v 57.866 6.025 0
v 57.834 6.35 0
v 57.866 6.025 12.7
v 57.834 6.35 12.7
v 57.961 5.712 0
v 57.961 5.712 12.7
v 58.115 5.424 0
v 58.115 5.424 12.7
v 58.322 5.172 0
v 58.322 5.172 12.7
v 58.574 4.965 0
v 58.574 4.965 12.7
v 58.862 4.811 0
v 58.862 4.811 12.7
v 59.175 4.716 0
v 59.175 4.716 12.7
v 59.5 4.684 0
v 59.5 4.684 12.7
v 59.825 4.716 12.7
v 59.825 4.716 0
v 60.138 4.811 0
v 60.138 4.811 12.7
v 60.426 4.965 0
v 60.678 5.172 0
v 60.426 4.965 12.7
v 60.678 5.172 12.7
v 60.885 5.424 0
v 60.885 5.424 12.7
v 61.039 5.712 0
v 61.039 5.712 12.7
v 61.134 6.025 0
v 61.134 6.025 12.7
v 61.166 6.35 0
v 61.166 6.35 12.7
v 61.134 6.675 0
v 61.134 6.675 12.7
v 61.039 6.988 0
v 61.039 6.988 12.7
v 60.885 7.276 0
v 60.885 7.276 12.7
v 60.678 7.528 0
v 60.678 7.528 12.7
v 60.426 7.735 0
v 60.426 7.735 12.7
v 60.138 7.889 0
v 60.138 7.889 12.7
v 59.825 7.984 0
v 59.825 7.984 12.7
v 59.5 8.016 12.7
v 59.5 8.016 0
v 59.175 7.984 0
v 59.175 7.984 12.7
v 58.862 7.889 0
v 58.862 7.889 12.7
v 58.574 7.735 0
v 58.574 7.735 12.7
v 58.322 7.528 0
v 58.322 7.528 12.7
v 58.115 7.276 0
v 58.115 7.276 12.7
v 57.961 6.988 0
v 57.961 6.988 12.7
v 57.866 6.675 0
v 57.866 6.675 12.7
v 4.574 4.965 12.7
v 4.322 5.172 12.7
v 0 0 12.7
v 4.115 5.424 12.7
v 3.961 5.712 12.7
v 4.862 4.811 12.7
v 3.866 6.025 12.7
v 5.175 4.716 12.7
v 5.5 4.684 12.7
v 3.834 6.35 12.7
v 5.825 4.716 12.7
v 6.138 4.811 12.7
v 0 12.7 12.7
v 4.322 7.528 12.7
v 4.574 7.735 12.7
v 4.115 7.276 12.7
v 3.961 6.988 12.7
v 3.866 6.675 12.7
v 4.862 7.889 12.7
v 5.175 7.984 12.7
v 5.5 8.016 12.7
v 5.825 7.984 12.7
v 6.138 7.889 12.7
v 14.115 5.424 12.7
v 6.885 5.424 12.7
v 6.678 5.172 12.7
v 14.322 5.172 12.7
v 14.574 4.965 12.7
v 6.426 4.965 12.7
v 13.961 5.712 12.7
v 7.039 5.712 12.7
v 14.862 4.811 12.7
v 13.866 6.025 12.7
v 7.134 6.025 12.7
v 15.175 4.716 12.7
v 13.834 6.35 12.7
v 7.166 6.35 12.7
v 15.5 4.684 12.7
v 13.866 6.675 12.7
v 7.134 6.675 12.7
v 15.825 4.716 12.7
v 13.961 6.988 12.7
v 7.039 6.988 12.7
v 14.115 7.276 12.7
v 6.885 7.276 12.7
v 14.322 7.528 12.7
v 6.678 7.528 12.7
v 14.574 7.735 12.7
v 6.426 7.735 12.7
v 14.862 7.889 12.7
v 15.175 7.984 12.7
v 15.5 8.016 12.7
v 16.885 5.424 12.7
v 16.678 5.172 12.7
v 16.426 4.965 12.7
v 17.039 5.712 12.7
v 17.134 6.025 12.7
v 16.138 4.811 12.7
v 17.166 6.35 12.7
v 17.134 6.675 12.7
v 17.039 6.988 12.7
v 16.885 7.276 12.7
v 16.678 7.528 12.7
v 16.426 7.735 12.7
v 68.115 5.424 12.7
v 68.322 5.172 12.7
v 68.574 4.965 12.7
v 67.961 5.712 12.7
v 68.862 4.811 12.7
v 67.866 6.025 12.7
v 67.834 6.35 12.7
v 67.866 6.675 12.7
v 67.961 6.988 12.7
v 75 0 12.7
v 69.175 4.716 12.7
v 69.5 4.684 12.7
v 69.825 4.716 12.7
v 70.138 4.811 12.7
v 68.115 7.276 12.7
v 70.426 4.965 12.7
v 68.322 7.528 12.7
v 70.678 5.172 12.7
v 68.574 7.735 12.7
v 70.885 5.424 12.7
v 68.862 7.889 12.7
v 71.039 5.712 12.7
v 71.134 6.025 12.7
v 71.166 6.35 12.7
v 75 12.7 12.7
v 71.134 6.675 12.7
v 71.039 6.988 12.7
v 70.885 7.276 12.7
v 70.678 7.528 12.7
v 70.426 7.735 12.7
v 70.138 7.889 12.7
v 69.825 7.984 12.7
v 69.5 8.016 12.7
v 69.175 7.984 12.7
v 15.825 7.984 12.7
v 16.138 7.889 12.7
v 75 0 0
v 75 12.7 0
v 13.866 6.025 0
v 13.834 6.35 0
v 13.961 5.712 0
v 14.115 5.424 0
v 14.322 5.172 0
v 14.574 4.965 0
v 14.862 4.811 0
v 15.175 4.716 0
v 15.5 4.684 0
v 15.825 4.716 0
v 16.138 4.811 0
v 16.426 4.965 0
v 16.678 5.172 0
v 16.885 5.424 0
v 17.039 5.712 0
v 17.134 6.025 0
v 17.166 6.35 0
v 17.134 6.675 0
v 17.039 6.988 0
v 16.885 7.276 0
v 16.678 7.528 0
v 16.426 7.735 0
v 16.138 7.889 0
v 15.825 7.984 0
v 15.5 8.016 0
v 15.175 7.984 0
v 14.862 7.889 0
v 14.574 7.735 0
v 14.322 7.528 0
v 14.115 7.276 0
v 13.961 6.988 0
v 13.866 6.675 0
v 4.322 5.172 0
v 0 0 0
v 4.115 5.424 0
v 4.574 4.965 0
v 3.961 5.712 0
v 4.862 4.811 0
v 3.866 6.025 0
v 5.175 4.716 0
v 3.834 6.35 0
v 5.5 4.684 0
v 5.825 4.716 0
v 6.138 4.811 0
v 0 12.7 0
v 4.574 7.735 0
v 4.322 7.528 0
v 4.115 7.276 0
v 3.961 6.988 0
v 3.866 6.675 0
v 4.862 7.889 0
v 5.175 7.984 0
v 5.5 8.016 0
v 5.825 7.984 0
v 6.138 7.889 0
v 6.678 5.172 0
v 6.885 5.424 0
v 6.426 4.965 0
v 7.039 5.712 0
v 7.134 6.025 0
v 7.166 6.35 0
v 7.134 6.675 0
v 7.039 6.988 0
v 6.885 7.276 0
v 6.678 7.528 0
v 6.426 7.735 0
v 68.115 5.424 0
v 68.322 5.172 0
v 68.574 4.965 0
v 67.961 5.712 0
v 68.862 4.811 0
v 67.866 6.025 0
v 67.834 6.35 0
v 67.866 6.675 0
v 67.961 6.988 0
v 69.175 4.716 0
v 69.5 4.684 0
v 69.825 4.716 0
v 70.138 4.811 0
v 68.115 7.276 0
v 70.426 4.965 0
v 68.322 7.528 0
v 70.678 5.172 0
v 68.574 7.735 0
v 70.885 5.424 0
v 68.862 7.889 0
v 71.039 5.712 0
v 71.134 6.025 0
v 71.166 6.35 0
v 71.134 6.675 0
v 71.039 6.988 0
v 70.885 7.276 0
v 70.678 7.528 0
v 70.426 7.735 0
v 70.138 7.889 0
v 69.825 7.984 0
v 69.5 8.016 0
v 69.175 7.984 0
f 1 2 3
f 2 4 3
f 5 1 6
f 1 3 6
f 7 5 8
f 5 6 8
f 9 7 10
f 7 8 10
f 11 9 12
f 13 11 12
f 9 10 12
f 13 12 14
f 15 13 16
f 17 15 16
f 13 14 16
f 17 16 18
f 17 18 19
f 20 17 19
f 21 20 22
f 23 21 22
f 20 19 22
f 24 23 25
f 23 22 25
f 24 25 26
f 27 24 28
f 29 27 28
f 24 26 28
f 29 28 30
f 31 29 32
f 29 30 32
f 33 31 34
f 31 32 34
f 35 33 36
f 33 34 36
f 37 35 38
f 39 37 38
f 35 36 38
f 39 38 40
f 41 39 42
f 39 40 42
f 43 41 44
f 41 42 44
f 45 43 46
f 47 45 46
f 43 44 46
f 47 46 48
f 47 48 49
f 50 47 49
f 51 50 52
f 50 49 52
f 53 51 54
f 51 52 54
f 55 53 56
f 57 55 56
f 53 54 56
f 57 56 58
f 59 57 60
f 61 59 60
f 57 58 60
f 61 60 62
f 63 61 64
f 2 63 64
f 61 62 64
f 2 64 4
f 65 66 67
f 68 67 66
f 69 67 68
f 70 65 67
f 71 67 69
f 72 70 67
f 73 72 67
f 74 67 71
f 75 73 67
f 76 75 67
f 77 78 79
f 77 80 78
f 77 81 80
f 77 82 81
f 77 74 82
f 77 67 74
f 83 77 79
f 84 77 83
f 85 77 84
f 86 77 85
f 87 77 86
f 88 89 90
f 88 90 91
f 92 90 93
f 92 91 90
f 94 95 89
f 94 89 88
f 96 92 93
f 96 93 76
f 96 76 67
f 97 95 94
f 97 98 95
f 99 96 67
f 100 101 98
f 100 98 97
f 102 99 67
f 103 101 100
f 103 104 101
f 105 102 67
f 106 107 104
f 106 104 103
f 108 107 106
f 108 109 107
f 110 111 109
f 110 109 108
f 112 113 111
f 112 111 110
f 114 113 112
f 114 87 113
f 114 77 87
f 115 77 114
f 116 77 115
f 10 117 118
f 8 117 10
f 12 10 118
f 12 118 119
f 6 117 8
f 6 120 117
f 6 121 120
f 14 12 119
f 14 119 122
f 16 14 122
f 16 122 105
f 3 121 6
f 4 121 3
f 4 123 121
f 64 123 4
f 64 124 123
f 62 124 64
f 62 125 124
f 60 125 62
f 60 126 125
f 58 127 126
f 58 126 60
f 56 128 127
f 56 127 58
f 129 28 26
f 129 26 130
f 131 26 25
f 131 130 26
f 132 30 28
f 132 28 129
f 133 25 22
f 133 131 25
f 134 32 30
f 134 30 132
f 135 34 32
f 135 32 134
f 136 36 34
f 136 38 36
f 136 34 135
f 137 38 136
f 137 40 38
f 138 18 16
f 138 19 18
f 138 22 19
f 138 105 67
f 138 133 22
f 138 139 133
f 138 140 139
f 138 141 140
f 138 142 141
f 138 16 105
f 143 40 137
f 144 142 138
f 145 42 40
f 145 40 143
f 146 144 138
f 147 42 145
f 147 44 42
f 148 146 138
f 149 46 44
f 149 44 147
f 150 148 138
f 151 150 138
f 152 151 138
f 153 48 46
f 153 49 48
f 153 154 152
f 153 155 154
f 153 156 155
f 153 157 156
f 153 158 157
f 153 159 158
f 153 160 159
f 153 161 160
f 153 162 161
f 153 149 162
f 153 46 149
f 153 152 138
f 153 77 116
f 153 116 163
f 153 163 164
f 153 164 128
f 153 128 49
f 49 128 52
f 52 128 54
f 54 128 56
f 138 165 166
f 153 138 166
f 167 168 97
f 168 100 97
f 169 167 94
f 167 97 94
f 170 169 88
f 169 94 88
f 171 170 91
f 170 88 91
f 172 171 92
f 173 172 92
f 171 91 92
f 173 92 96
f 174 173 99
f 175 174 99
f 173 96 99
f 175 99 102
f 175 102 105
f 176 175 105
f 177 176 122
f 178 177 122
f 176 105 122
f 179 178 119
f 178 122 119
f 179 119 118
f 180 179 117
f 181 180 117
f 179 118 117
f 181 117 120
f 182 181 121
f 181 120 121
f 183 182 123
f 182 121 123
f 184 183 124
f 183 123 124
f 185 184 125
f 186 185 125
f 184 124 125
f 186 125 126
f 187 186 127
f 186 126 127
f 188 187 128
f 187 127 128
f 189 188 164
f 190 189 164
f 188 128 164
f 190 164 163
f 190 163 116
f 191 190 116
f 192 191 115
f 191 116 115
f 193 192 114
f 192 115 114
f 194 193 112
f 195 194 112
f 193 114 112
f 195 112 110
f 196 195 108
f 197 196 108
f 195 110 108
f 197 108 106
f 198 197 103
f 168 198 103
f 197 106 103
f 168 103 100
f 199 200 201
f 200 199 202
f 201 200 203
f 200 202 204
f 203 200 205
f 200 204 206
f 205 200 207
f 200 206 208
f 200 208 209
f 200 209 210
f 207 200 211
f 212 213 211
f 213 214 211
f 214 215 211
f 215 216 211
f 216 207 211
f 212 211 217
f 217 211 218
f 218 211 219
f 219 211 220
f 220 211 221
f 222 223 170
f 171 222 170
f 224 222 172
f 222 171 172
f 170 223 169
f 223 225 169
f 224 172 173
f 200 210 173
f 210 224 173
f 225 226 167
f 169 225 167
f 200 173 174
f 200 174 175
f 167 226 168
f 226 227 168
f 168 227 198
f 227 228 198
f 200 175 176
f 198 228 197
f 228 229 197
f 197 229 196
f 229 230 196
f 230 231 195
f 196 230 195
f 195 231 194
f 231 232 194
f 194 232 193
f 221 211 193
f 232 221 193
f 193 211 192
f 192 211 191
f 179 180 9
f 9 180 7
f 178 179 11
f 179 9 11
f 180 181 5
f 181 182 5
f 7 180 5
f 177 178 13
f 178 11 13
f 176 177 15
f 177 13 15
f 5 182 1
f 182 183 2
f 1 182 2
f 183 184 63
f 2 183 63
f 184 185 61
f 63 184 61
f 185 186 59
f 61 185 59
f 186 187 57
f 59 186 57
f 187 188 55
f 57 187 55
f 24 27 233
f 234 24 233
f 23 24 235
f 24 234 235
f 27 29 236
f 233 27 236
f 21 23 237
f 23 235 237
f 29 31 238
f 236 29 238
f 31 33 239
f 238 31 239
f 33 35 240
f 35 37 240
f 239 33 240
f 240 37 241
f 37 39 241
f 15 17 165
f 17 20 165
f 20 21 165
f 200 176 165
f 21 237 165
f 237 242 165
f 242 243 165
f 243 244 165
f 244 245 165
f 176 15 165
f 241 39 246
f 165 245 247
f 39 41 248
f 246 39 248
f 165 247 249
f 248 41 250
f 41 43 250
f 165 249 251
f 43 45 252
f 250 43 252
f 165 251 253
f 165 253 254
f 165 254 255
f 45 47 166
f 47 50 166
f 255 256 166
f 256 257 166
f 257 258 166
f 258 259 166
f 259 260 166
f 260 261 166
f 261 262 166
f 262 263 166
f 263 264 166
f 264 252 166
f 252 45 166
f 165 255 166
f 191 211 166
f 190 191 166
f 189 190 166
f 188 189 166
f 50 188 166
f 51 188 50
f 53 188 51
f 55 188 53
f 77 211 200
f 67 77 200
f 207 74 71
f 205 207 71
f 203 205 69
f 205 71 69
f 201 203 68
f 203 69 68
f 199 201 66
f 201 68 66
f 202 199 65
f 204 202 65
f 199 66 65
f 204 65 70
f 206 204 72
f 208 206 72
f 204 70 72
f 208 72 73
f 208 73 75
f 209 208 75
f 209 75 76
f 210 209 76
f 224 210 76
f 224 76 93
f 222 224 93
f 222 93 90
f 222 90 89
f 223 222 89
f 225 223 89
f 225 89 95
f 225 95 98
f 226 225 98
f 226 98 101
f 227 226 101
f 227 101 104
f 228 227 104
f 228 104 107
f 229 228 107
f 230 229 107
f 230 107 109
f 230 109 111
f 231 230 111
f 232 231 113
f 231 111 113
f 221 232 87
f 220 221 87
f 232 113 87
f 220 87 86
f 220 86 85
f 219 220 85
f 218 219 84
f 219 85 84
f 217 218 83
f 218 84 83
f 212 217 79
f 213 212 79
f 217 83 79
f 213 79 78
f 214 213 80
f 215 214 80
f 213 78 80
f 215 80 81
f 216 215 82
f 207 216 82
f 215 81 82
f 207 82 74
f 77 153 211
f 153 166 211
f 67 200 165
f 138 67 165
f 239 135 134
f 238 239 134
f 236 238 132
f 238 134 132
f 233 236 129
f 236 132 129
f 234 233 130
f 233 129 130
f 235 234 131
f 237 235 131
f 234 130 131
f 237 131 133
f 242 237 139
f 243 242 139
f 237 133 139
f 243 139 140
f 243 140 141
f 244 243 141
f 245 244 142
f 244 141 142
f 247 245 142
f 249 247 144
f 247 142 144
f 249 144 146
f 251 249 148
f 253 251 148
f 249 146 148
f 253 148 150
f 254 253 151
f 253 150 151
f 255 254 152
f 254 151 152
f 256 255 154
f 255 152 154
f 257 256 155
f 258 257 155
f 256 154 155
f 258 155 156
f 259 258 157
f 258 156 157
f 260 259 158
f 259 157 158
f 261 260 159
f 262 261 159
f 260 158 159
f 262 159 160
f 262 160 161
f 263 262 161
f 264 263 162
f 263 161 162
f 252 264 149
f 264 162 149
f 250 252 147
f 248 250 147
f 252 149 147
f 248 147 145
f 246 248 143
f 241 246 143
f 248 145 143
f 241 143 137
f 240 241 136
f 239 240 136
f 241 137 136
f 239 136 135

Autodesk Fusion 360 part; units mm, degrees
sketch "Sketch1" plane through (0, 0, 0) normal (0, 0, 1) x (1, 0, 0)
  line L0 (0, 0) -> (75, 0)
  line L1 (75, 0) -> (75, 12.7)
  line L2 (75, 12.7) -> (0, 12.7)
  line L3 (0, 12.7) -> (0, 0)
  dimension "d1" = 75
  dimension "d2" = 12.7
extrude "Extrude1" add sketch "Sketch1" along normal blind 12.7
sketch "Sketch2" plane through (0, 0, 12.7) normal (0, 0, 1) x (-1, 0, 0)
  line L0 (0, -12.7) -> (0, 0)
  line L1 (0, 0) -> (-75, 0)
  line L2 (-75, 0) -> (-75, -12.7)
  line L3 (-75, -12.7) -> (0, -12.7)
  circle A0 centre (-5.5, -6.35) radius 2
  circle A1 centre (-15.5, -6.35) radius 2
  circle A2 centre (-69.5, -6.35) radius 2
  circle A3 centre (-59.5, -6.35) radius 2
  line L4 (-5.5, -6.35) -> (0, -6.35)
  line L5 (-69.5, -6.35) -> (-75, -6.35)
  dimension "d5" = 4
  dimension "d6" = 4
  dimension "d7" = 10
  dimension "d8" = 4
  dimension "d9" = 4
  dimension "d10" = 10
  dimension "d11" = 44
  dimension "d12" = 64
extrude "Extrude2" cut sketch "Sketch2" against normal blind 17.78 contours A0 | A1 | A2 | A3
thread "Thread1" "ISO Metric profile 4.0 M4x0.7 6H" major diameter 4.1095 minor diameter 3.332 pitch 0.7 angle 60 resizes the face on face at (70.8965, 7.7817, 8.4667) on face at (57.5099, 6.5492, 4.2333) on face at (13.5099, 6.5491, 4.2333) on face at (3.5099, 6.5491, 4.2333)
